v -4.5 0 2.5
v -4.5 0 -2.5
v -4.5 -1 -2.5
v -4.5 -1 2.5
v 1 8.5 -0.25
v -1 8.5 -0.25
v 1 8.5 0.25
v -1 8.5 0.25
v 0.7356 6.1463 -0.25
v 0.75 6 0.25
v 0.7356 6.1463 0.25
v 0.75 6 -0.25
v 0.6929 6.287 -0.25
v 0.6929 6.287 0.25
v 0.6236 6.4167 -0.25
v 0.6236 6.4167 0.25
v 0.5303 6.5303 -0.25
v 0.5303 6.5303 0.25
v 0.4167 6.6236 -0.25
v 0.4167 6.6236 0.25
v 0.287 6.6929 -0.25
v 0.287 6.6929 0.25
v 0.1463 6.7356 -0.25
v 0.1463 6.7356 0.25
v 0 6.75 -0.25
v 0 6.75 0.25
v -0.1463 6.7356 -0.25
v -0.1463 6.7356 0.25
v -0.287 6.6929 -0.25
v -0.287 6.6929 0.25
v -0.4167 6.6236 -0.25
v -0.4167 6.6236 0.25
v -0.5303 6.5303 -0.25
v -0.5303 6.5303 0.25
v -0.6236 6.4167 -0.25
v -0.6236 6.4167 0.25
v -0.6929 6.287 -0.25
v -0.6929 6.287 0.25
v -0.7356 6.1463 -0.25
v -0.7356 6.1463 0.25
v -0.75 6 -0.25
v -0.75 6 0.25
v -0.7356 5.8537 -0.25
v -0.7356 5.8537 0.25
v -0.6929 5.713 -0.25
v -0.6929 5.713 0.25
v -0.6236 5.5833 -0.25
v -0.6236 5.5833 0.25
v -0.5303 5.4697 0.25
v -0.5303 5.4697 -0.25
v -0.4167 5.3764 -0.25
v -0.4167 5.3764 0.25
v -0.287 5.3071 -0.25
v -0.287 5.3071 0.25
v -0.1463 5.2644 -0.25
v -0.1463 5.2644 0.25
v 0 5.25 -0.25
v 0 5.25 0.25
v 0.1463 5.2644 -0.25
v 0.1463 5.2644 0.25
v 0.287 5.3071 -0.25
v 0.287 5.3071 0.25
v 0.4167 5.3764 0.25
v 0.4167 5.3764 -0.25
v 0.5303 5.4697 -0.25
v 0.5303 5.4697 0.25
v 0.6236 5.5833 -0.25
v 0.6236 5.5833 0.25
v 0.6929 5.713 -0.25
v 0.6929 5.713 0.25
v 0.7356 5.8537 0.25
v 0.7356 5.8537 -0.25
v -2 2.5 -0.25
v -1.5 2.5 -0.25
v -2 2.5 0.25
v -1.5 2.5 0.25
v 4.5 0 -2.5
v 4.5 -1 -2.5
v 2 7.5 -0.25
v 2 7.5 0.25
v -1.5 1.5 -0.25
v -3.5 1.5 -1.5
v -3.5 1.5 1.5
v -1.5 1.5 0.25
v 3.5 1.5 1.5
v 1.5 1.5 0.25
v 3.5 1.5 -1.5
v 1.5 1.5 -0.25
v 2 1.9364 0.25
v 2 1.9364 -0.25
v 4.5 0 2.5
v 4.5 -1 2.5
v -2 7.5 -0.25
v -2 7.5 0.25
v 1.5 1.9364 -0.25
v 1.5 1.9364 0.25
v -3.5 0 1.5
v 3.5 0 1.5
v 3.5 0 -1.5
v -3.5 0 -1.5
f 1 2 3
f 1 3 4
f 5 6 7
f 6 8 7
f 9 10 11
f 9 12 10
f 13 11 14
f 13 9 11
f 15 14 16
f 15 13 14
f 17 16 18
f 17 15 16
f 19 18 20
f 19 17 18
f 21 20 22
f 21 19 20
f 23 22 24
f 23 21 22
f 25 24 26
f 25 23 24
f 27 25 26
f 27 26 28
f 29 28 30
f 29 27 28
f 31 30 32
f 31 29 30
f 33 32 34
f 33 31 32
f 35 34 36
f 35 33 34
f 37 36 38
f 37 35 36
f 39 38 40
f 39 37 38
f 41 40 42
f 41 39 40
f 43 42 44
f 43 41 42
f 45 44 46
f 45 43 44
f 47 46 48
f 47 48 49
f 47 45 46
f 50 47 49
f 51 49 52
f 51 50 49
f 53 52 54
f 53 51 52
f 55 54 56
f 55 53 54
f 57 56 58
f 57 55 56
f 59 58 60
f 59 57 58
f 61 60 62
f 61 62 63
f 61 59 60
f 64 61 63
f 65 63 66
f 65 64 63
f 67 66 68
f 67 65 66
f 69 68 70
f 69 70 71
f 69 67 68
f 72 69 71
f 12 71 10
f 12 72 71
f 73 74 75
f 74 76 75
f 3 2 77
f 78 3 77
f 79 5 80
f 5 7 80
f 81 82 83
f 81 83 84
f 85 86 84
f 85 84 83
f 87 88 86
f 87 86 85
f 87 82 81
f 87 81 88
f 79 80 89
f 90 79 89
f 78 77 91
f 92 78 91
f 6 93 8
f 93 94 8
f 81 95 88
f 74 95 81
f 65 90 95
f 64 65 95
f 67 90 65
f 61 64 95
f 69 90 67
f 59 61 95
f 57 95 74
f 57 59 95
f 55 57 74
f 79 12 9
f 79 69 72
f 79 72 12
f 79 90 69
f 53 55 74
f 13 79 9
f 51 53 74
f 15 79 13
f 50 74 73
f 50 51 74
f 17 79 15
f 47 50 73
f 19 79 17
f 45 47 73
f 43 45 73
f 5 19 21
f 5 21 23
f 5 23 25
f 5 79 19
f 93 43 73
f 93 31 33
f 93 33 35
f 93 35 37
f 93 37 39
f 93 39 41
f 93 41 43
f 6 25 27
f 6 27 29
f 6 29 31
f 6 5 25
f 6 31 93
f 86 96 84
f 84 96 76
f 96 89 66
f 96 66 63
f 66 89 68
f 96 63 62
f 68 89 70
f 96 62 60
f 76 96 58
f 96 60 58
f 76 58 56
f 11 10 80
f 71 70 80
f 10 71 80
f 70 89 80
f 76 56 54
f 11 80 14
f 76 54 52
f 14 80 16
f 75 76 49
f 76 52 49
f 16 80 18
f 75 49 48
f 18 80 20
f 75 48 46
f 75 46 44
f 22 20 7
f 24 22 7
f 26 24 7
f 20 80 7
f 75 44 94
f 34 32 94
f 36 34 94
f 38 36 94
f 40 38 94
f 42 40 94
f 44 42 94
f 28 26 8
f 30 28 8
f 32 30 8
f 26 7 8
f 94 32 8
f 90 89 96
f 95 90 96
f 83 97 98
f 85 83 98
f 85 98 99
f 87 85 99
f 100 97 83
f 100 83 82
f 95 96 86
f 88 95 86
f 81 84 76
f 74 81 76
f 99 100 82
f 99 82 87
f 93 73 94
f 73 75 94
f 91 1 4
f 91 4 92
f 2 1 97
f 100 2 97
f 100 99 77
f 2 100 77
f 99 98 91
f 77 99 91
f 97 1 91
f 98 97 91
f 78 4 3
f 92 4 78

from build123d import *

# Parameters (mm, degrees)
SKETCH1_W           = 7
SKETCH1_H           = 3
BOSS_EXTRUDE1_DEPTH = 1.5
SKETCH2_W           = 9
SKETCH2_H           = 5
BOSS_EXTRUDE2_DEPTH = 1
SKETCH3_R           = 0.75
BOSS_EXTRUDE3_DEPTH = 0.25


with BuildPart() as part:
    # Sketch1 → Boss-Extrude1 (new body)
    with BuildSketch(Plane(origin=(0, 0, 0), x_dir=(1, 0, 0), z_dir=(0, 1, 0))):
        Rectangle(SKETCH1_W, SKETCH1_H)
    extrude(amount=BOSS_EXTRUDE1_DEPTH)

    # Sketch2 → Boss-Extrude2 (add)
    with BuildSketch(Plane.XZ):
        Rectangle(SKETCH2_W, SKETCH2_H)
    extrude(amount=BOSS_EXTRUDE2_DEPTH)

    # Sketch3 → Boss-Extrude3 (add, symmetric)
    with BuildSketch(Plane.XY):
        Polygon((-1.5, 1.5), (-1.5, 2.5), (-2, 2.5), (-2, 7.5), (-1, 8.5), (1, 8.5), (2, 7.5), (2, 1.936391511), (1.5, 1.936391511), (1.5, 1.5), align=None)
        with Locations((0, 6)):
            Circle(SKETCH3_R, mode=Mode.SUBTRACT)
    extrude(amount=BOSS_EXTRUDE3_DEPTH, both=True)


solid = part.part
